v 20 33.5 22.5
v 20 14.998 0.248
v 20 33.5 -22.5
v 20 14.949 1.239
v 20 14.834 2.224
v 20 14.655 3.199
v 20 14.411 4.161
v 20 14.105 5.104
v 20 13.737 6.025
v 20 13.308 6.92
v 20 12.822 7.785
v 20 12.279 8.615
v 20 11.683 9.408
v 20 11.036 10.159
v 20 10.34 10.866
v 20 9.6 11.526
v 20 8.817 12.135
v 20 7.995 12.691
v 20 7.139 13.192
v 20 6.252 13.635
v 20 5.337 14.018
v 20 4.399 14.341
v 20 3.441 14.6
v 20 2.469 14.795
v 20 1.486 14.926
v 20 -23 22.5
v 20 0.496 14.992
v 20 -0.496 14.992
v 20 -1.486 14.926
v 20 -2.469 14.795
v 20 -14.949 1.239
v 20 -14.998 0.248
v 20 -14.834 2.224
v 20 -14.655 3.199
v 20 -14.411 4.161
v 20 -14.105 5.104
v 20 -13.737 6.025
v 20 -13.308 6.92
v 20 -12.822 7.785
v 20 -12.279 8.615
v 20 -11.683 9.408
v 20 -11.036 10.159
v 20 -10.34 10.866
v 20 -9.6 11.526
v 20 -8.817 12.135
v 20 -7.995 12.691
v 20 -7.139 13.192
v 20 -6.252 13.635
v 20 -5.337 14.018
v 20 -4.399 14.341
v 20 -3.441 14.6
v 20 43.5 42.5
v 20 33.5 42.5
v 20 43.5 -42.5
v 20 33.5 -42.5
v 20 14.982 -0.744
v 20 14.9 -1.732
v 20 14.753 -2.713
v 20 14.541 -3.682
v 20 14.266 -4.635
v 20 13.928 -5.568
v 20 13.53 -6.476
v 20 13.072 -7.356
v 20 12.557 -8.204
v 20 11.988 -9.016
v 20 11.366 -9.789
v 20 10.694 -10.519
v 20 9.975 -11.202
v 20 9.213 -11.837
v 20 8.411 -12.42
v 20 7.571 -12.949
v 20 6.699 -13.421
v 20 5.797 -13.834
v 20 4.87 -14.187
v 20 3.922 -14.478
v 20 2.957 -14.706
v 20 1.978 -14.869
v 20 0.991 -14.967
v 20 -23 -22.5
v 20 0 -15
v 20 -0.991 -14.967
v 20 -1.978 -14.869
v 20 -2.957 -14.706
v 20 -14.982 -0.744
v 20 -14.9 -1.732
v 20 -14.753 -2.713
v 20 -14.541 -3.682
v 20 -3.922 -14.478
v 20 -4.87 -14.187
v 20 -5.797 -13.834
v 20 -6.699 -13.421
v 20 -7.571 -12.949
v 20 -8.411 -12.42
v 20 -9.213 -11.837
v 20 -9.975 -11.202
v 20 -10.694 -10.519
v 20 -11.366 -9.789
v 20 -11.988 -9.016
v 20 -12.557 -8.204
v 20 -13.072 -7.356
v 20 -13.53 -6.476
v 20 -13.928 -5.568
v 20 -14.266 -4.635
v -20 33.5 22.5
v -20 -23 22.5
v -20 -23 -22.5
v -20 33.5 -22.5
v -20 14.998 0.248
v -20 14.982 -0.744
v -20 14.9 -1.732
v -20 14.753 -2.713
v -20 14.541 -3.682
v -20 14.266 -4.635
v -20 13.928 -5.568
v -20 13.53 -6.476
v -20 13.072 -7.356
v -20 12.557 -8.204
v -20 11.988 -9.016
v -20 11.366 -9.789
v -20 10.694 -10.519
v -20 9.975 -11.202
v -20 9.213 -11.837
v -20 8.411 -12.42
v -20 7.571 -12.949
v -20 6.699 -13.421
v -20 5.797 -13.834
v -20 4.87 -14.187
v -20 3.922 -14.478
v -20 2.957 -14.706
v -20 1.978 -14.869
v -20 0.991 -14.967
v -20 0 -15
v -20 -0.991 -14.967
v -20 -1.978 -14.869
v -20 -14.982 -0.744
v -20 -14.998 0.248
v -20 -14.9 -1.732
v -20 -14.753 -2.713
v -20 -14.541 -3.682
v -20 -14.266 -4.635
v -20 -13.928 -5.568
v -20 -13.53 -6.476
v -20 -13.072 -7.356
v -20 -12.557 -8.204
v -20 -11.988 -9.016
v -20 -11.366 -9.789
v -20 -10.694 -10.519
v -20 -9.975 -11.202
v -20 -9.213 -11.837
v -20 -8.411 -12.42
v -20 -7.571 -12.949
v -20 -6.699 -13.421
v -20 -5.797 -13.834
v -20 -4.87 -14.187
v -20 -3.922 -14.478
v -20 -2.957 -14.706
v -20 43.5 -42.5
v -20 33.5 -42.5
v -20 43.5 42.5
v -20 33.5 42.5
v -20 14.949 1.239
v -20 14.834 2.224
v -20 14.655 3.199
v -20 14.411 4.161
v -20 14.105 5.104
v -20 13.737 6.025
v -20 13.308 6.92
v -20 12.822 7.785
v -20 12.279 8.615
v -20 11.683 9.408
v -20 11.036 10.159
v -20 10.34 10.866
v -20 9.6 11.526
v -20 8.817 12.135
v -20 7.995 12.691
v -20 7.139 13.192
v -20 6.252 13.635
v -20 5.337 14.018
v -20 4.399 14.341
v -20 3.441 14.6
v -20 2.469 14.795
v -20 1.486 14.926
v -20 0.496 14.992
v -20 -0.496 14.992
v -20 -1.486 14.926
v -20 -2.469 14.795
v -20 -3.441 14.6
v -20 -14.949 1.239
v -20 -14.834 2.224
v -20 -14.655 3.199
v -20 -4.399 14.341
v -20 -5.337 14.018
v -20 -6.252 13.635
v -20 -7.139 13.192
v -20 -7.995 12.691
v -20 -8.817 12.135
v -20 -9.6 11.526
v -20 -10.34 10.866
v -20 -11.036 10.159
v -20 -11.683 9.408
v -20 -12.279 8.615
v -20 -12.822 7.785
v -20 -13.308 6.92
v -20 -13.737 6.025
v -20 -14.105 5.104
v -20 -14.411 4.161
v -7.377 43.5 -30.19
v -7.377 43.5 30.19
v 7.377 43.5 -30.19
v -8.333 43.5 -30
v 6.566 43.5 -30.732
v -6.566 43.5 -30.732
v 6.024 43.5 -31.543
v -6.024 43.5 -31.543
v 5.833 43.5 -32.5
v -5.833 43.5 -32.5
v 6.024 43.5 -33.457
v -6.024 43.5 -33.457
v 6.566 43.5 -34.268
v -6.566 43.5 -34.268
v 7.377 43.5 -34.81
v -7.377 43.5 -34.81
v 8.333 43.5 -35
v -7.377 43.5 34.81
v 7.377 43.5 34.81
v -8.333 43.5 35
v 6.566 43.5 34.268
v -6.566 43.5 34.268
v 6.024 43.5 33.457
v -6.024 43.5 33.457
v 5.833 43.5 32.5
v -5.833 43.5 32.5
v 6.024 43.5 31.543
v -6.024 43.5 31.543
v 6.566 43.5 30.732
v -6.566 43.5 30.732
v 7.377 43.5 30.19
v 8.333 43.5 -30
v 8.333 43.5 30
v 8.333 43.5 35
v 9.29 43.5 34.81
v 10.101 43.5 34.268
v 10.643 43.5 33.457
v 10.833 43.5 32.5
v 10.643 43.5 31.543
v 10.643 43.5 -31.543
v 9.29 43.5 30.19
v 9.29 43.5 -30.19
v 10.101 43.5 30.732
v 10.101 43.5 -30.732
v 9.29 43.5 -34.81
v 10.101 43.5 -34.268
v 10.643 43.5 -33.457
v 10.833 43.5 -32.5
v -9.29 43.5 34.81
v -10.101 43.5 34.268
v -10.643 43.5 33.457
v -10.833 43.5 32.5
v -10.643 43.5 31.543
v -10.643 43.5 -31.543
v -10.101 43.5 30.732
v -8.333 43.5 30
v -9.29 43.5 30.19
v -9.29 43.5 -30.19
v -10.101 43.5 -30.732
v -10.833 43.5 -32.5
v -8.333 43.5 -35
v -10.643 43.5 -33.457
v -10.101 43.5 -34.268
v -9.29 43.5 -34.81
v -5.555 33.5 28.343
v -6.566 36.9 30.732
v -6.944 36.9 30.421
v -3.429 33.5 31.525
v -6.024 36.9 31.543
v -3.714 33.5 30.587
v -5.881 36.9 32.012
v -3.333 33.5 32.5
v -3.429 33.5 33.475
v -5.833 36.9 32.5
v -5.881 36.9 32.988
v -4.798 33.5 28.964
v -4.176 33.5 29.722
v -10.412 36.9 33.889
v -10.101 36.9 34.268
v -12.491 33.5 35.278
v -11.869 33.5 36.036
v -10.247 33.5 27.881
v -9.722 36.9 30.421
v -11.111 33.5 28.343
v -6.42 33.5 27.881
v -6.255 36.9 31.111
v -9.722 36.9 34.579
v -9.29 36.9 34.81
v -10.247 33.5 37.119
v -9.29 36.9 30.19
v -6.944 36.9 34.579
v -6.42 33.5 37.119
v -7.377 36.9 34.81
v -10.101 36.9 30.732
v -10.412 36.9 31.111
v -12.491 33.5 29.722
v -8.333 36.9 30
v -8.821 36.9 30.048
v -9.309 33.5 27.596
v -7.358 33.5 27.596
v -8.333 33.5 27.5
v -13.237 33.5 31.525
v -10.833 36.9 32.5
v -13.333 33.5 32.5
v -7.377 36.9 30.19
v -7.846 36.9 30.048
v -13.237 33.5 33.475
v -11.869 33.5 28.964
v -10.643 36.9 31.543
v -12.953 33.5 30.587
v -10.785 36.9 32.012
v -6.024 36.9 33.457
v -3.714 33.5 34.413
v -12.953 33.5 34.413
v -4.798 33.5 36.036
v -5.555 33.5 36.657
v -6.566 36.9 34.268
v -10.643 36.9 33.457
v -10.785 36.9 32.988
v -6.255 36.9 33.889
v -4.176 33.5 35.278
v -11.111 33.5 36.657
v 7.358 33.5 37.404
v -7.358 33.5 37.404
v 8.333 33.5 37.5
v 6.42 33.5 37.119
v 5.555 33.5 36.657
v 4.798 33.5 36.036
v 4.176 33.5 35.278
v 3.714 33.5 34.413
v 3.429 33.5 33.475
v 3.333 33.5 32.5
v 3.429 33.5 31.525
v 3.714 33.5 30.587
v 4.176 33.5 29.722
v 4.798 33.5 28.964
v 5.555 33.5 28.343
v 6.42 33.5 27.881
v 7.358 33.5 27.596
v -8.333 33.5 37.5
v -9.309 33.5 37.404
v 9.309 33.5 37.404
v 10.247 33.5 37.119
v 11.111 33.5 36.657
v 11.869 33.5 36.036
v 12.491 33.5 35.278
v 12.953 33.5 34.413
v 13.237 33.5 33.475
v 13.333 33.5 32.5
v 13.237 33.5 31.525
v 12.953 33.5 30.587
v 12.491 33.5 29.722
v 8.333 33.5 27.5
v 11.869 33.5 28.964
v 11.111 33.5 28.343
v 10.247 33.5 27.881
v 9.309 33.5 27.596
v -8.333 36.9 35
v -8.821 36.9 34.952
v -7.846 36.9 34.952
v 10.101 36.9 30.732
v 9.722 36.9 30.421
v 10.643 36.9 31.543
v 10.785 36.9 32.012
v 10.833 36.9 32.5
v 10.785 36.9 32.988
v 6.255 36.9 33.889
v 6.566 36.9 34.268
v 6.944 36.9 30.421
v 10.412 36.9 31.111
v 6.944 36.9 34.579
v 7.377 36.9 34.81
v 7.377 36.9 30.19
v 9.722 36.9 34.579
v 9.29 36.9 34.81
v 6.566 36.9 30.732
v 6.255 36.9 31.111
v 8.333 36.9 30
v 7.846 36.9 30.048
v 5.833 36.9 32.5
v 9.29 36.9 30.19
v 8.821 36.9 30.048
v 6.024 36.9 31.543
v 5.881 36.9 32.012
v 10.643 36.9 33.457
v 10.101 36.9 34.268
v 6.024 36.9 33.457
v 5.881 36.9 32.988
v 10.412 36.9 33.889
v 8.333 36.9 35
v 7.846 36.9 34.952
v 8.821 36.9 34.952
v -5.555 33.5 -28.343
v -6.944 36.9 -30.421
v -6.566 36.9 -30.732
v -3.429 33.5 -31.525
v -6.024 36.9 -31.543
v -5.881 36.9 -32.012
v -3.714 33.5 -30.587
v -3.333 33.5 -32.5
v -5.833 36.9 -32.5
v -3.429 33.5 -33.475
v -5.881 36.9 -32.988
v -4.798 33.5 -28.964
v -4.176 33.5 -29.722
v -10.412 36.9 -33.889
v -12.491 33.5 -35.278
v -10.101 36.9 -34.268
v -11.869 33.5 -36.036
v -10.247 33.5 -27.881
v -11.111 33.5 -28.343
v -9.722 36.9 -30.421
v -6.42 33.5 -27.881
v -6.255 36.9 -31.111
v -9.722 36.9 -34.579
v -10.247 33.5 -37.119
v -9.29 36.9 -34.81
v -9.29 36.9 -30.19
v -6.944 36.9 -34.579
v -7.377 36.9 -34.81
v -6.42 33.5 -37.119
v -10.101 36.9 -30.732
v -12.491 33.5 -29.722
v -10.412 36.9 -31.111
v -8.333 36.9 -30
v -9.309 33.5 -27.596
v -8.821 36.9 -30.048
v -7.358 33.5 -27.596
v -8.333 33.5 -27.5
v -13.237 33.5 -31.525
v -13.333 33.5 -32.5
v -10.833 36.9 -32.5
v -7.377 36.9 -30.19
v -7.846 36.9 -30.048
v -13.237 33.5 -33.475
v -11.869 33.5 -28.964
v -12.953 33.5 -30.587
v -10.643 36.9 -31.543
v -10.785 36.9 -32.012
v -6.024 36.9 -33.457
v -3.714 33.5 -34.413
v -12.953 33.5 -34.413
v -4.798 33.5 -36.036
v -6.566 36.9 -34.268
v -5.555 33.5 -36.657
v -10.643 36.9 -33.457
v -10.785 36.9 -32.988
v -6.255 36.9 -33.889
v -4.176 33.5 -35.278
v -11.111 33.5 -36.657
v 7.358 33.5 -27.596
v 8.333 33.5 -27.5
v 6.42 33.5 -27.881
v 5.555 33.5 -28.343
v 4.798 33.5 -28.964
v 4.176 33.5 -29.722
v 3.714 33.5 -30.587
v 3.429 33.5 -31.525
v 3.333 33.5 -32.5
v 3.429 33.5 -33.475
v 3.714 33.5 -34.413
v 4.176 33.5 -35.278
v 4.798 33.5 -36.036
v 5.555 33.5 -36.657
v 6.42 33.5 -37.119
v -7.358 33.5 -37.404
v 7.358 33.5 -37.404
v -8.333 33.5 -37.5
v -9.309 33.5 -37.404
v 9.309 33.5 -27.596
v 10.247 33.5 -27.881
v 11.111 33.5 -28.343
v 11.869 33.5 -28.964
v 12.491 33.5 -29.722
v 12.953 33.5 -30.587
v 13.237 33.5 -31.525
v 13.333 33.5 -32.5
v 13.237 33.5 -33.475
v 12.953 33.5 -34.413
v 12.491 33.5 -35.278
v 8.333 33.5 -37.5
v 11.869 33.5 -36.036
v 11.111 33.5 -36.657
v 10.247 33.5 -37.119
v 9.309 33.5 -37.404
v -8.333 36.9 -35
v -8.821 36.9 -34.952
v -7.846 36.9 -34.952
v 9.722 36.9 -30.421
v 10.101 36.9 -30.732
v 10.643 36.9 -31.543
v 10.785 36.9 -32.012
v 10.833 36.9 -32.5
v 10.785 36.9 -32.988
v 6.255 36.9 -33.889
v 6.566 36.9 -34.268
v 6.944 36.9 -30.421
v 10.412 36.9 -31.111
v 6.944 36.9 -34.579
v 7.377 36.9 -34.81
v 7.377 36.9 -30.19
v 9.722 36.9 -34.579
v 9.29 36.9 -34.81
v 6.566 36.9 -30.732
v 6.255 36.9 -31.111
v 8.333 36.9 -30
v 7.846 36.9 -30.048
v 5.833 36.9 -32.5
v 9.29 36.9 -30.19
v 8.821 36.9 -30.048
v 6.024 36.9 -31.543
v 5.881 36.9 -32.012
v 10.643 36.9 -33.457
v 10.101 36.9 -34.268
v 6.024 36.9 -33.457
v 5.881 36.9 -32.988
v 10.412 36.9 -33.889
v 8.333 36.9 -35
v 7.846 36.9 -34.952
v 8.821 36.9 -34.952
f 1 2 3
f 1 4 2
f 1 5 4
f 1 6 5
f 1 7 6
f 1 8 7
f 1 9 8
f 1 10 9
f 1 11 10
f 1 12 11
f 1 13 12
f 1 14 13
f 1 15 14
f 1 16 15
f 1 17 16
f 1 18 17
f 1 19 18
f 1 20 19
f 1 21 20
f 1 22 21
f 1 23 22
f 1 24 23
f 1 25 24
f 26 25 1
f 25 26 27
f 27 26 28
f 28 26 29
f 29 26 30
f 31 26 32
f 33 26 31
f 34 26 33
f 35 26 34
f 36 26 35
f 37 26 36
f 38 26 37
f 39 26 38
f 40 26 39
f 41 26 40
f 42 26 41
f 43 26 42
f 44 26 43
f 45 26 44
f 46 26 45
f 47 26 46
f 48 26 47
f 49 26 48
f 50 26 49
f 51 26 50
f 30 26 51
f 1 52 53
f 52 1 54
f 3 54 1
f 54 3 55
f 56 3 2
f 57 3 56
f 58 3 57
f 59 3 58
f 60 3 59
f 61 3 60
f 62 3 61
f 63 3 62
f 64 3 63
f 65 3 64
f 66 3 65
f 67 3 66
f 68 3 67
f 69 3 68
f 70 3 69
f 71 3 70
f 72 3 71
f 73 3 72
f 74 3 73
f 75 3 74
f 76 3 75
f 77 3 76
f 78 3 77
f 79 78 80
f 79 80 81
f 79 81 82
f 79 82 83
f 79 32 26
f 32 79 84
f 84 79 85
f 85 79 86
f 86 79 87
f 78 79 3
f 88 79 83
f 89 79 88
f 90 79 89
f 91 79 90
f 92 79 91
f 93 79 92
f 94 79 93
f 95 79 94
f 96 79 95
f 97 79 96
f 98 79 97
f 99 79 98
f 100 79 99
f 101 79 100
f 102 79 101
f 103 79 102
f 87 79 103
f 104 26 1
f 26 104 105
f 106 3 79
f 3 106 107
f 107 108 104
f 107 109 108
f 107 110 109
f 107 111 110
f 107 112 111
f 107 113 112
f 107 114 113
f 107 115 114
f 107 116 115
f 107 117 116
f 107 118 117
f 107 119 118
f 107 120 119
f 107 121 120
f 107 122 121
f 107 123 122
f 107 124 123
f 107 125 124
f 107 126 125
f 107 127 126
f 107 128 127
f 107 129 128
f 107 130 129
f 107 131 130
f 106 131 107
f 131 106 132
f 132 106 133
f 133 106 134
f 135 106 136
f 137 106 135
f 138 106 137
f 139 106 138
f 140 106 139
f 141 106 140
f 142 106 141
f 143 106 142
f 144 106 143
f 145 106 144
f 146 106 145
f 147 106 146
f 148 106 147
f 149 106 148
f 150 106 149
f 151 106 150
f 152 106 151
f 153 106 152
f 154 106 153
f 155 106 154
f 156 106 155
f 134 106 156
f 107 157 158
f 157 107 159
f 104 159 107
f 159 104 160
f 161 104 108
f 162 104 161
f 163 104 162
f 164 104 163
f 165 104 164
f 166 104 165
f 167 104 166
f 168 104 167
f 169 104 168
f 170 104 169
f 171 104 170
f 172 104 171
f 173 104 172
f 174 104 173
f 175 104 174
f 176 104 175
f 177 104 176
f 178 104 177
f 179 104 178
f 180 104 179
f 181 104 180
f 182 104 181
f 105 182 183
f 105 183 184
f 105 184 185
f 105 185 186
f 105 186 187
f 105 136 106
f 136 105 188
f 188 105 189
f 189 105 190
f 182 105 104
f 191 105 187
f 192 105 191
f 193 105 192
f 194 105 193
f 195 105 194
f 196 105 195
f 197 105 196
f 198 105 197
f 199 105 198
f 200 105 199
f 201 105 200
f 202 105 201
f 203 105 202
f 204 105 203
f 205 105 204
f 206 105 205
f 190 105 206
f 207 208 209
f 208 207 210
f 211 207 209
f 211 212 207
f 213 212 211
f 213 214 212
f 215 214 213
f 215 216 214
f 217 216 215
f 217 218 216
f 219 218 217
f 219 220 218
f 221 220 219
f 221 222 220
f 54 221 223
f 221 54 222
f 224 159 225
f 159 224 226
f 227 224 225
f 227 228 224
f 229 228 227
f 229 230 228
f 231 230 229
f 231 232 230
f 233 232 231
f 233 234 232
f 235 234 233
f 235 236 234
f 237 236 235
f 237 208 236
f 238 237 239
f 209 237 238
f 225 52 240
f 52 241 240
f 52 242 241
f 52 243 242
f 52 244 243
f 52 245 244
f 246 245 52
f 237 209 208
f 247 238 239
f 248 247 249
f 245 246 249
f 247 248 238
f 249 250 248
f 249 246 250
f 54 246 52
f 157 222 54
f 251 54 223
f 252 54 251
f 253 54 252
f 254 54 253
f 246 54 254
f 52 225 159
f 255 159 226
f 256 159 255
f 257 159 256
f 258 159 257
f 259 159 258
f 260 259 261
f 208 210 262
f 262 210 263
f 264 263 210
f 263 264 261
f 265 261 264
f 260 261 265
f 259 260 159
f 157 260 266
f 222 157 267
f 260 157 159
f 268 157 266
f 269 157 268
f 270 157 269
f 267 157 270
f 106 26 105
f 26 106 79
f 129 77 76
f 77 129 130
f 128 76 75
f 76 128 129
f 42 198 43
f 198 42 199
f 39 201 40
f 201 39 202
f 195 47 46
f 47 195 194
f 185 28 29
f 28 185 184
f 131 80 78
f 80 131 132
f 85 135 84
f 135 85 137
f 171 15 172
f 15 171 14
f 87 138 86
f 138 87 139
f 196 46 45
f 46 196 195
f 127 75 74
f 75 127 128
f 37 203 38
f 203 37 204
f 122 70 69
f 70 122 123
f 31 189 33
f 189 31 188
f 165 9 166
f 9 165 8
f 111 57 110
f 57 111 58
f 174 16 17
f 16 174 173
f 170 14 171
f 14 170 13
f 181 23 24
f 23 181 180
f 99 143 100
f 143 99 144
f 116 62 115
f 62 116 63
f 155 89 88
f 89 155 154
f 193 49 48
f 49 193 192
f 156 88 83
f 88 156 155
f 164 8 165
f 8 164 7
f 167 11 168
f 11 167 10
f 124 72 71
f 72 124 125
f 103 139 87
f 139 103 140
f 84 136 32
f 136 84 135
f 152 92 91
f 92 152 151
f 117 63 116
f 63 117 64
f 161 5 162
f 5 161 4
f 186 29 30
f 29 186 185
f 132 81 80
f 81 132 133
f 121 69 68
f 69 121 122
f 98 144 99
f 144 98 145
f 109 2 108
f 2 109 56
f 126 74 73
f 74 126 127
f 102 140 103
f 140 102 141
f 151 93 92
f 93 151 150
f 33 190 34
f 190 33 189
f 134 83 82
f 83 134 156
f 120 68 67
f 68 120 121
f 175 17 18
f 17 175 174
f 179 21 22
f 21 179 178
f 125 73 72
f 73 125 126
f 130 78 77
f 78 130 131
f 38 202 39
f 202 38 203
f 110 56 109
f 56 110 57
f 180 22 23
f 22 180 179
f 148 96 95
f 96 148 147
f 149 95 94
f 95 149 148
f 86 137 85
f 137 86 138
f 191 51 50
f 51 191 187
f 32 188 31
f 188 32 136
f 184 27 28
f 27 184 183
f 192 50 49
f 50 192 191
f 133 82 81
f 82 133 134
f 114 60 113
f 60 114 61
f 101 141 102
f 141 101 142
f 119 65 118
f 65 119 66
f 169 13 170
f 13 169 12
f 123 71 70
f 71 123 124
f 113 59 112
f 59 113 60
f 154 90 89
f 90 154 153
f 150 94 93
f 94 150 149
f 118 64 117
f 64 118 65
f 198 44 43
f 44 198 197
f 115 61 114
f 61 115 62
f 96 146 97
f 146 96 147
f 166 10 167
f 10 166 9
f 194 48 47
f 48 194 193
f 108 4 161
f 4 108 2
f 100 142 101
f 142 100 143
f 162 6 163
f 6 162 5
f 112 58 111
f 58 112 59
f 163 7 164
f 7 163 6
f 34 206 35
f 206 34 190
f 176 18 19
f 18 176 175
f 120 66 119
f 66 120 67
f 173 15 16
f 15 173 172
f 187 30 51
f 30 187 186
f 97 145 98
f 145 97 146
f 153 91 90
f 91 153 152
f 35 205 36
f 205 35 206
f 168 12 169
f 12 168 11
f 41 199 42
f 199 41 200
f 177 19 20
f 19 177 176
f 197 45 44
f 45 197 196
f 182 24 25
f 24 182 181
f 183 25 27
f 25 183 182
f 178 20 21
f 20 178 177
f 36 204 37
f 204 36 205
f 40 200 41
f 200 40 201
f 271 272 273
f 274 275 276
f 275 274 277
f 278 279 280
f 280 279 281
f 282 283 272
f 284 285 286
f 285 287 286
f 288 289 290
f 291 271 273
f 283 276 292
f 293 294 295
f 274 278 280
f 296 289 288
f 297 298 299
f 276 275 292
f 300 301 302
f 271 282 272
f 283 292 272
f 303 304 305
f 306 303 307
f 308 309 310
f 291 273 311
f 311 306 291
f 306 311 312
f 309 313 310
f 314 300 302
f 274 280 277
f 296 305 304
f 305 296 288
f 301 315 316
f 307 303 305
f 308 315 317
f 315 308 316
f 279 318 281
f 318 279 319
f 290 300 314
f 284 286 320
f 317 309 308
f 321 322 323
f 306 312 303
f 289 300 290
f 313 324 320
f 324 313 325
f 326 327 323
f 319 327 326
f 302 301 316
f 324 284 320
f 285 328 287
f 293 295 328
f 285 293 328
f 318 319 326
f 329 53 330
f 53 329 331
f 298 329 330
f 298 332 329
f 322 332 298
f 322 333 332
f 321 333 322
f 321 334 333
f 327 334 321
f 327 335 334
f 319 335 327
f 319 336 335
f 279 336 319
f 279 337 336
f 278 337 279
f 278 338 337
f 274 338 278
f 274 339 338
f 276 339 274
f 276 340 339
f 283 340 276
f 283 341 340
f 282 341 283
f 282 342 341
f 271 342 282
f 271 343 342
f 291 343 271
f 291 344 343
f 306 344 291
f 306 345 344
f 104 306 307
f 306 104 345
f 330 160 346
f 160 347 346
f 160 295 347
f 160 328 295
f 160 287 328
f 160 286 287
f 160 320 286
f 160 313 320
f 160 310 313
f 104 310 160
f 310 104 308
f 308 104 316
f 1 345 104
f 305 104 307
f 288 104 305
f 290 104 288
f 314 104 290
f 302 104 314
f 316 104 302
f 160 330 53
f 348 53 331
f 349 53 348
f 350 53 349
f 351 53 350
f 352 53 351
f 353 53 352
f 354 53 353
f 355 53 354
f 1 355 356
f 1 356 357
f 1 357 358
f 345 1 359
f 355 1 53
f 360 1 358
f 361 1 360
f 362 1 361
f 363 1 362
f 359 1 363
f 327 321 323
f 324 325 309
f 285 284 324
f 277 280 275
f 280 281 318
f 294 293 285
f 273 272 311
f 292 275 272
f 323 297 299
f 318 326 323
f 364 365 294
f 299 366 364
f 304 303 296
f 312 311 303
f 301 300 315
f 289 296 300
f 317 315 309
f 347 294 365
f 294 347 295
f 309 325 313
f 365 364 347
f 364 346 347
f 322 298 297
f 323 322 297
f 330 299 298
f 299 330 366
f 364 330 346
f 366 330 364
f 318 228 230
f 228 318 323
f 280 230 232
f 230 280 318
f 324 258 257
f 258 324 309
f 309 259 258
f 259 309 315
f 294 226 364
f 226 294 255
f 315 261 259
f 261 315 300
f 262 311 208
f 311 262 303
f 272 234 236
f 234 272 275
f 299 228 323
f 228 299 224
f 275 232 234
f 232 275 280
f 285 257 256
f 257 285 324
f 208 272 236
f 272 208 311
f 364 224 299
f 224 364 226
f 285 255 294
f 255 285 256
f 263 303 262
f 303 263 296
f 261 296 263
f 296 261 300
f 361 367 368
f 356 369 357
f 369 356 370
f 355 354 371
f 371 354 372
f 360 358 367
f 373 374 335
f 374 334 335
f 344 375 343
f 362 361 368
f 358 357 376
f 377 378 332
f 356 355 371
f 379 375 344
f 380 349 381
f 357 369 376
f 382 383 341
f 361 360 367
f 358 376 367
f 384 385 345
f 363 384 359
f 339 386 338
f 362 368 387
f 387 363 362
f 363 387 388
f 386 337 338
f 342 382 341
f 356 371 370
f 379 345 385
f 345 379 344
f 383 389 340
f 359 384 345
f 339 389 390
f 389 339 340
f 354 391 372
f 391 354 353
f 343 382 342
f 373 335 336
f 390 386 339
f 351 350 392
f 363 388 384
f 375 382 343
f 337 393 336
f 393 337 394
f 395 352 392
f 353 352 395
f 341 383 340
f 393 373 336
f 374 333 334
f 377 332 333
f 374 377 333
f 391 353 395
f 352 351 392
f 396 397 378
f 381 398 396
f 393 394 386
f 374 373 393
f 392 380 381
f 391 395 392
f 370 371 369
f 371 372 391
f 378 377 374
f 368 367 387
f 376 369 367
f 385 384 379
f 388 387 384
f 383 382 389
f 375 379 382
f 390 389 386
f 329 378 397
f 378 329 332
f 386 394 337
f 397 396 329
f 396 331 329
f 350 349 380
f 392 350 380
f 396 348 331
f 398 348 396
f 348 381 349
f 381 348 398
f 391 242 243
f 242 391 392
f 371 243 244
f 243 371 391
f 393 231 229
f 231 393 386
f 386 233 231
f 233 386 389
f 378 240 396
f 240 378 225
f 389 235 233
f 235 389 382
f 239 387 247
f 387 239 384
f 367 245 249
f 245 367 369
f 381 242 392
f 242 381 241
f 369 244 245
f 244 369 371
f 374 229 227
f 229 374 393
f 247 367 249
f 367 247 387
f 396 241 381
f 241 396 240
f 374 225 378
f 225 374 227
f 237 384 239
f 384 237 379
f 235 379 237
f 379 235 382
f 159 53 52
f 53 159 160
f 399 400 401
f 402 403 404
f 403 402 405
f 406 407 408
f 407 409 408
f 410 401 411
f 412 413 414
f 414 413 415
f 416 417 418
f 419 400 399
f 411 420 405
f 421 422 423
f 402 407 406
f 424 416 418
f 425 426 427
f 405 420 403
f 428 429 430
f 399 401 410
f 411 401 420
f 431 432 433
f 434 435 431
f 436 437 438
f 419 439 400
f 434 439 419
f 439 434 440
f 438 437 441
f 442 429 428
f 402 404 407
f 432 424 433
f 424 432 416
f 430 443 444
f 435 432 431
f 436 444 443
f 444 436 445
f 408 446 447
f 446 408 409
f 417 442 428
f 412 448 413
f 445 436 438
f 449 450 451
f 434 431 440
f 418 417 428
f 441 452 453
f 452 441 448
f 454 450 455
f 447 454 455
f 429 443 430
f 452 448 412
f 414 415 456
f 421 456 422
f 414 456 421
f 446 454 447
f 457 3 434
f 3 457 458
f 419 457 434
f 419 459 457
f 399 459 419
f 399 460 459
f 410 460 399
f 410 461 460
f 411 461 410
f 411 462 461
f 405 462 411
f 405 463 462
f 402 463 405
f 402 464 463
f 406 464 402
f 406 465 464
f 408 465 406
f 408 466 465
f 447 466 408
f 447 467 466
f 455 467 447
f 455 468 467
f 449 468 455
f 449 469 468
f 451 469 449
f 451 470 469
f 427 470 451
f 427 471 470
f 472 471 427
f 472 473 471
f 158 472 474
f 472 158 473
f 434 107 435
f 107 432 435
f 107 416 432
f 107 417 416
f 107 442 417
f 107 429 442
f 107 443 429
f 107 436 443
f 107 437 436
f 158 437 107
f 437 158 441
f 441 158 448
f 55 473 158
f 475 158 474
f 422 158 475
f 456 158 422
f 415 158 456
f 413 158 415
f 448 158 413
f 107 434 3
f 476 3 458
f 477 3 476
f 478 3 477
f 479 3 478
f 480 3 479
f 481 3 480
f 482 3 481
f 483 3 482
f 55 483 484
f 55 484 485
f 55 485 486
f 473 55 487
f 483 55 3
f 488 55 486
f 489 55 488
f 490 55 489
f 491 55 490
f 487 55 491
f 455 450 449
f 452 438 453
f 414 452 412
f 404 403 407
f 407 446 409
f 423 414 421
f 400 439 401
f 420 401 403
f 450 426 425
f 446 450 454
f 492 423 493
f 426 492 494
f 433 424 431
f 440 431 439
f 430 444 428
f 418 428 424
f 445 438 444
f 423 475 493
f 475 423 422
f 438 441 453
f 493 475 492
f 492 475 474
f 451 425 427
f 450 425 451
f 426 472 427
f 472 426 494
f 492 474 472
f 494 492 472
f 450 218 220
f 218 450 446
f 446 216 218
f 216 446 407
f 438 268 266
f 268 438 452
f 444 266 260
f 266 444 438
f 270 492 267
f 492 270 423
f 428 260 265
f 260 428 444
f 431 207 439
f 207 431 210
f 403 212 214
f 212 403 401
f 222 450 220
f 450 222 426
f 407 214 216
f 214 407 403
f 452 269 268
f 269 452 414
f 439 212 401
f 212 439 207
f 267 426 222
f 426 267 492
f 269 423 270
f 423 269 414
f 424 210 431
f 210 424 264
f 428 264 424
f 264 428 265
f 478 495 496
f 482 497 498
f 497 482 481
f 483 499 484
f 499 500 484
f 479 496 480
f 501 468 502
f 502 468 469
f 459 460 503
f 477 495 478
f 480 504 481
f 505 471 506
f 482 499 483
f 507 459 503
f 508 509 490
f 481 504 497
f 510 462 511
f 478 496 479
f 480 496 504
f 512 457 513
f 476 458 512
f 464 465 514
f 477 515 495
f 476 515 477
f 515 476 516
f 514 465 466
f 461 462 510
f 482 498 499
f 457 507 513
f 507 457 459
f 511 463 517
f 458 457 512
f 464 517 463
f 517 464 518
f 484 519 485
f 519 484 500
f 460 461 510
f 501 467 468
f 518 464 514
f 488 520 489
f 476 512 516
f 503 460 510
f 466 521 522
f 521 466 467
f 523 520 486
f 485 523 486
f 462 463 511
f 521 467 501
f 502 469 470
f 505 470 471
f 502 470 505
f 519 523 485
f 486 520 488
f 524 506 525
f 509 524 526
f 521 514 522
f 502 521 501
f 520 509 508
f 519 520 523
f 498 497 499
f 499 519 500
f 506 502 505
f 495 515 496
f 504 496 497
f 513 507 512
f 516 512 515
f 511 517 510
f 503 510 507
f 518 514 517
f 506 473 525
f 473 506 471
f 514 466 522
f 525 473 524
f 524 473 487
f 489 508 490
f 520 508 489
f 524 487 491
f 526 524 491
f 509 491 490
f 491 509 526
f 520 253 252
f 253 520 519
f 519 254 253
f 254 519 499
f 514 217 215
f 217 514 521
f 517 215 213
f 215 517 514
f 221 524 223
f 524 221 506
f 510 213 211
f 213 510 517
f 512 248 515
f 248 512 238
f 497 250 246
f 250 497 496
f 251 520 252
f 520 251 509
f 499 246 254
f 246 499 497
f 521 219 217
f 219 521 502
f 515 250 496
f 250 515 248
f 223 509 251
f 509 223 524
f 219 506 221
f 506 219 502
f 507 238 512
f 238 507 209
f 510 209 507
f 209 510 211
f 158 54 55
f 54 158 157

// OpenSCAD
module bar_screwboard(width=40, height=15, depth=2, number_holes=2, top_diameter=10, bottom_diameter=4.8, diameter_change_depth=3.4) {
	color("lightblue") {
		top_radius = top_diameter / 2;
		bottom_radius = bottom_diameter / 2;
		
		translate([-width/2, 0, 0])
		rotate([90, 0, 0])
		difference() {
			cube([width, height, depth], center=false);
			
			x = (width-number_holes*2*top_radius) / (number_holes+1); // spacing between edge and screw hole and between two screw holes
			for (i=[1:number_holes]) {
				translate([(i*x+(2*i-1)*top_radius), height/2, 0]) {
					translate([0, 0, depth-diameter_change_depth])
					cylinder(r1=bottom_radius, r2=top_radius, h=diameter_change_depth, center=false);
					
					cylinder(r=bottom_radius, h=depth-diameter_change_depth, center=false);
				}
			}
		}
	}
}

module bar_holder(width=10, height=20, depth_before=10, depth_after=20, bar_diameter=10, screwboard_number_holes=2, screwboard_height=10, screwboard_depth=5, screwboard_top_diameter=10, screwboard_bottom_diameter=4.8, screwboard_diameter_change_depth=3.4) {	
	depth_sum = depth_before+bar_diameter+depth_after;
	
	difference() {
		translate([0, depth_sum/2-(depth_before+bar_diameter/2), 0])
			cube([width, depth_before+bar_diameter+depth_after, height], center=true);
		
		rotate([0, 90, 0])
			cylinder(d=bar_diameter, h=width, center=true);
	}
	
	translate([0, bar_diameter/2+depth_after, height/2])
		bar_screwboard(width=width, height=screwboard_height, depth=screwboard_depth, number_holes=screwboard_number_holes, top_diameter=screwboard_top_diameter, bottom_diameter=screwboard_bottom_diameter, diameter_change_depth=screwboard_diameter_change_depth);		
	
	mirror([0, 0, 1])
	translate([0, bar_diameter/2+depth_after, height/2])
		bar_screwboard(width=width, height=screwboard_height, depth=screwboard_depth, number_holes=screwboard_number_holes, top_diameter=screwboard_top_diameter, bottom_diameter=screwboard_bottom_diameter, 	diameter_change_depth=screwboard_diameter_change_depth);
}

$fa = 1;
$fs = 1;

bar_holder(width=40, height=45, depth_before=8, depth_after=28.5, bar_diameter=30, screwboard_number_holes=2, screwboard_height=20, screwboard_depth=10, screwboard_top_diameter=10, screwboard_bottom_diameter=5, screwboard_diameter_change_depth=3.4);
// bar_screwboard(width=40, height=20, depth=10, number_holes=2, top_diameter=10, bottom_diameter=4.8, diameter_change_depth=3.4);
